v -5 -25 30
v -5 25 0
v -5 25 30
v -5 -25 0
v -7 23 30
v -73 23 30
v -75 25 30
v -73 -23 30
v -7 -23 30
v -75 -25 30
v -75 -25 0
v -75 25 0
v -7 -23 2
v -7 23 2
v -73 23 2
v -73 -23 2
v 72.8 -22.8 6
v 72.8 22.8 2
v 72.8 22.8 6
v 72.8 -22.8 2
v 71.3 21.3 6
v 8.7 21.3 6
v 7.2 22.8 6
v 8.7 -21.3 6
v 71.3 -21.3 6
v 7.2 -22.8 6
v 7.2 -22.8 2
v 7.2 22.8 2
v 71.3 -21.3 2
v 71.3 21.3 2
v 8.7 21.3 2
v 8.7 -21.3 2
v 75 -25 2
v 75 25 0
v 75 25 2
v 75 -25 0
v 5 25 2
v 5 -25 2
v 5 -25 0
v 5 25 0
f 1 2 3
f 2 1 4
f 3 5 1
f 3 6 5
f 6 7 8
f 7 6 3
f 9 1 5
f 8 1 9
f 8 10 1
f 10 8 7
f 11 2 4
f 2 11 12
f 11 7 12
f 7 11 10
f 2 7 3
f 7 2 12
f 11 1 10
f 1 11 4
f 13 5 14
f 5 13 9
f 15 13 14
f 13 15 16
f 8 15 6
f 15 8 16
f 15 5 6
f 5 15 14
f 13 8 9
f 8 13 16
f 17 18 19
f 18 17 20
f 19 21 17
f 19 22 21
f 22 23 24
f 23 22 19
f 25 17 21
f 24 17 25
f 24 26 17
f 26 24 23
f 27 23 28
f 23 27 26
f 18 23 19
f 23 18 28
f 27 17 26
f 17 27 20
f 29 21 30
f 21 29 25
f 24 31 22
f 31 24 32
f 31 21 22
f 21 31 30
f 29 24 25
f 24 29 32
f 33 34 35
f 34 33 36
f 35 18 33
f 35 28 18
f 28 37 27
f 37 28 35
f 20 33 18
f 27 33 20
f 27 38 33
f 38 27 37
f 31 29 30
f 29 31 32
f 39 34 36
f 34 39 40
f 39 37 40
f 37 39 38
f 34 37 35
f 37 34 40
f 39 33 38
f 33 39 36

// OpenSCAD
// Two-part enclosure: open-top box + upside-down lid, printed side by side
// Units: mm

$fn = 64;

// ---------- Box ----------
box_x     = 70;    // box outer length (X)
box_y     = 50;    // box outer width (Y)
box_z     = 30;    // box outer height (Z)
wall      = 2;     // box wall thickness
floor_t   = 2;     // box floor thickness

// ---------- Lid ----------
lid_x     = 70;    // lid plate length (X)
lid_y     = 50;    // lid plate width (Y)
lid_t     = 2;     // lid plate thickness
lip_x     = 65.6;  // lip outer length (X)
lip_y     = 45.6;  // lip outer width (Y)
lip_wall  = 1.5;   // lip wall thickness
lip_h     = 4;     // lip height above plate

// ---------- Layout ----------
gap       = 10;    // gap between parts on the bed
eps       = 0.5;   // cutter overshoot past faces

// Centre the whole pair on the origin in X
total_x   = box_x + gap + lid_x;
box_cx    = -total_x/2 + box_x/2;          // box centre X
lid_cx    =  total_x/2 - lid_x/2;          // lid centre X (+X side)

// ---------- Part 1: box ----------
module box() {
    difference() {
        translate([-box_x/2, -box_y/2, 0])
            cube([box_x, box_y, box_z]);
        // inner cavity, open top
        translate([-(box_x - 2*wall)/2, -(box_y - 2*wall)/2, floor_t])
            cube([box_x - 2*wall, box_y - 2*wall, box_z - floor_t + eps]);
    }
}

// ---------- Part 2: lid (upside down) ----------
module lid() {
    union() {
        // plate on the bed
        translate([-lid_x/2, -lid_y/2, 0])
            cube([lid_x, lid_y, lid_t]);
        // rectangular lip on top of plate
        difference() {
            translate([-lip_x/2, -lip_y/2, lid_t - 0.01])
                cube([lip_x, lip_y, lip_h + 0.01]);
            translate([-(lip_x - 2*lip_wall)/2, -(lip_y - 2*lip_wall)/2, lid_t - eps])
                cube([lip_x - 2*lip_wall, lip_y - 2*lip_wall, lip_h + 2*eps]);
        }
    }
}

// ---------- Assembly on the bed ----------
translate([box_cx, 0, 0]) box();
translate([lid_cx, 0, 0]) lid();
